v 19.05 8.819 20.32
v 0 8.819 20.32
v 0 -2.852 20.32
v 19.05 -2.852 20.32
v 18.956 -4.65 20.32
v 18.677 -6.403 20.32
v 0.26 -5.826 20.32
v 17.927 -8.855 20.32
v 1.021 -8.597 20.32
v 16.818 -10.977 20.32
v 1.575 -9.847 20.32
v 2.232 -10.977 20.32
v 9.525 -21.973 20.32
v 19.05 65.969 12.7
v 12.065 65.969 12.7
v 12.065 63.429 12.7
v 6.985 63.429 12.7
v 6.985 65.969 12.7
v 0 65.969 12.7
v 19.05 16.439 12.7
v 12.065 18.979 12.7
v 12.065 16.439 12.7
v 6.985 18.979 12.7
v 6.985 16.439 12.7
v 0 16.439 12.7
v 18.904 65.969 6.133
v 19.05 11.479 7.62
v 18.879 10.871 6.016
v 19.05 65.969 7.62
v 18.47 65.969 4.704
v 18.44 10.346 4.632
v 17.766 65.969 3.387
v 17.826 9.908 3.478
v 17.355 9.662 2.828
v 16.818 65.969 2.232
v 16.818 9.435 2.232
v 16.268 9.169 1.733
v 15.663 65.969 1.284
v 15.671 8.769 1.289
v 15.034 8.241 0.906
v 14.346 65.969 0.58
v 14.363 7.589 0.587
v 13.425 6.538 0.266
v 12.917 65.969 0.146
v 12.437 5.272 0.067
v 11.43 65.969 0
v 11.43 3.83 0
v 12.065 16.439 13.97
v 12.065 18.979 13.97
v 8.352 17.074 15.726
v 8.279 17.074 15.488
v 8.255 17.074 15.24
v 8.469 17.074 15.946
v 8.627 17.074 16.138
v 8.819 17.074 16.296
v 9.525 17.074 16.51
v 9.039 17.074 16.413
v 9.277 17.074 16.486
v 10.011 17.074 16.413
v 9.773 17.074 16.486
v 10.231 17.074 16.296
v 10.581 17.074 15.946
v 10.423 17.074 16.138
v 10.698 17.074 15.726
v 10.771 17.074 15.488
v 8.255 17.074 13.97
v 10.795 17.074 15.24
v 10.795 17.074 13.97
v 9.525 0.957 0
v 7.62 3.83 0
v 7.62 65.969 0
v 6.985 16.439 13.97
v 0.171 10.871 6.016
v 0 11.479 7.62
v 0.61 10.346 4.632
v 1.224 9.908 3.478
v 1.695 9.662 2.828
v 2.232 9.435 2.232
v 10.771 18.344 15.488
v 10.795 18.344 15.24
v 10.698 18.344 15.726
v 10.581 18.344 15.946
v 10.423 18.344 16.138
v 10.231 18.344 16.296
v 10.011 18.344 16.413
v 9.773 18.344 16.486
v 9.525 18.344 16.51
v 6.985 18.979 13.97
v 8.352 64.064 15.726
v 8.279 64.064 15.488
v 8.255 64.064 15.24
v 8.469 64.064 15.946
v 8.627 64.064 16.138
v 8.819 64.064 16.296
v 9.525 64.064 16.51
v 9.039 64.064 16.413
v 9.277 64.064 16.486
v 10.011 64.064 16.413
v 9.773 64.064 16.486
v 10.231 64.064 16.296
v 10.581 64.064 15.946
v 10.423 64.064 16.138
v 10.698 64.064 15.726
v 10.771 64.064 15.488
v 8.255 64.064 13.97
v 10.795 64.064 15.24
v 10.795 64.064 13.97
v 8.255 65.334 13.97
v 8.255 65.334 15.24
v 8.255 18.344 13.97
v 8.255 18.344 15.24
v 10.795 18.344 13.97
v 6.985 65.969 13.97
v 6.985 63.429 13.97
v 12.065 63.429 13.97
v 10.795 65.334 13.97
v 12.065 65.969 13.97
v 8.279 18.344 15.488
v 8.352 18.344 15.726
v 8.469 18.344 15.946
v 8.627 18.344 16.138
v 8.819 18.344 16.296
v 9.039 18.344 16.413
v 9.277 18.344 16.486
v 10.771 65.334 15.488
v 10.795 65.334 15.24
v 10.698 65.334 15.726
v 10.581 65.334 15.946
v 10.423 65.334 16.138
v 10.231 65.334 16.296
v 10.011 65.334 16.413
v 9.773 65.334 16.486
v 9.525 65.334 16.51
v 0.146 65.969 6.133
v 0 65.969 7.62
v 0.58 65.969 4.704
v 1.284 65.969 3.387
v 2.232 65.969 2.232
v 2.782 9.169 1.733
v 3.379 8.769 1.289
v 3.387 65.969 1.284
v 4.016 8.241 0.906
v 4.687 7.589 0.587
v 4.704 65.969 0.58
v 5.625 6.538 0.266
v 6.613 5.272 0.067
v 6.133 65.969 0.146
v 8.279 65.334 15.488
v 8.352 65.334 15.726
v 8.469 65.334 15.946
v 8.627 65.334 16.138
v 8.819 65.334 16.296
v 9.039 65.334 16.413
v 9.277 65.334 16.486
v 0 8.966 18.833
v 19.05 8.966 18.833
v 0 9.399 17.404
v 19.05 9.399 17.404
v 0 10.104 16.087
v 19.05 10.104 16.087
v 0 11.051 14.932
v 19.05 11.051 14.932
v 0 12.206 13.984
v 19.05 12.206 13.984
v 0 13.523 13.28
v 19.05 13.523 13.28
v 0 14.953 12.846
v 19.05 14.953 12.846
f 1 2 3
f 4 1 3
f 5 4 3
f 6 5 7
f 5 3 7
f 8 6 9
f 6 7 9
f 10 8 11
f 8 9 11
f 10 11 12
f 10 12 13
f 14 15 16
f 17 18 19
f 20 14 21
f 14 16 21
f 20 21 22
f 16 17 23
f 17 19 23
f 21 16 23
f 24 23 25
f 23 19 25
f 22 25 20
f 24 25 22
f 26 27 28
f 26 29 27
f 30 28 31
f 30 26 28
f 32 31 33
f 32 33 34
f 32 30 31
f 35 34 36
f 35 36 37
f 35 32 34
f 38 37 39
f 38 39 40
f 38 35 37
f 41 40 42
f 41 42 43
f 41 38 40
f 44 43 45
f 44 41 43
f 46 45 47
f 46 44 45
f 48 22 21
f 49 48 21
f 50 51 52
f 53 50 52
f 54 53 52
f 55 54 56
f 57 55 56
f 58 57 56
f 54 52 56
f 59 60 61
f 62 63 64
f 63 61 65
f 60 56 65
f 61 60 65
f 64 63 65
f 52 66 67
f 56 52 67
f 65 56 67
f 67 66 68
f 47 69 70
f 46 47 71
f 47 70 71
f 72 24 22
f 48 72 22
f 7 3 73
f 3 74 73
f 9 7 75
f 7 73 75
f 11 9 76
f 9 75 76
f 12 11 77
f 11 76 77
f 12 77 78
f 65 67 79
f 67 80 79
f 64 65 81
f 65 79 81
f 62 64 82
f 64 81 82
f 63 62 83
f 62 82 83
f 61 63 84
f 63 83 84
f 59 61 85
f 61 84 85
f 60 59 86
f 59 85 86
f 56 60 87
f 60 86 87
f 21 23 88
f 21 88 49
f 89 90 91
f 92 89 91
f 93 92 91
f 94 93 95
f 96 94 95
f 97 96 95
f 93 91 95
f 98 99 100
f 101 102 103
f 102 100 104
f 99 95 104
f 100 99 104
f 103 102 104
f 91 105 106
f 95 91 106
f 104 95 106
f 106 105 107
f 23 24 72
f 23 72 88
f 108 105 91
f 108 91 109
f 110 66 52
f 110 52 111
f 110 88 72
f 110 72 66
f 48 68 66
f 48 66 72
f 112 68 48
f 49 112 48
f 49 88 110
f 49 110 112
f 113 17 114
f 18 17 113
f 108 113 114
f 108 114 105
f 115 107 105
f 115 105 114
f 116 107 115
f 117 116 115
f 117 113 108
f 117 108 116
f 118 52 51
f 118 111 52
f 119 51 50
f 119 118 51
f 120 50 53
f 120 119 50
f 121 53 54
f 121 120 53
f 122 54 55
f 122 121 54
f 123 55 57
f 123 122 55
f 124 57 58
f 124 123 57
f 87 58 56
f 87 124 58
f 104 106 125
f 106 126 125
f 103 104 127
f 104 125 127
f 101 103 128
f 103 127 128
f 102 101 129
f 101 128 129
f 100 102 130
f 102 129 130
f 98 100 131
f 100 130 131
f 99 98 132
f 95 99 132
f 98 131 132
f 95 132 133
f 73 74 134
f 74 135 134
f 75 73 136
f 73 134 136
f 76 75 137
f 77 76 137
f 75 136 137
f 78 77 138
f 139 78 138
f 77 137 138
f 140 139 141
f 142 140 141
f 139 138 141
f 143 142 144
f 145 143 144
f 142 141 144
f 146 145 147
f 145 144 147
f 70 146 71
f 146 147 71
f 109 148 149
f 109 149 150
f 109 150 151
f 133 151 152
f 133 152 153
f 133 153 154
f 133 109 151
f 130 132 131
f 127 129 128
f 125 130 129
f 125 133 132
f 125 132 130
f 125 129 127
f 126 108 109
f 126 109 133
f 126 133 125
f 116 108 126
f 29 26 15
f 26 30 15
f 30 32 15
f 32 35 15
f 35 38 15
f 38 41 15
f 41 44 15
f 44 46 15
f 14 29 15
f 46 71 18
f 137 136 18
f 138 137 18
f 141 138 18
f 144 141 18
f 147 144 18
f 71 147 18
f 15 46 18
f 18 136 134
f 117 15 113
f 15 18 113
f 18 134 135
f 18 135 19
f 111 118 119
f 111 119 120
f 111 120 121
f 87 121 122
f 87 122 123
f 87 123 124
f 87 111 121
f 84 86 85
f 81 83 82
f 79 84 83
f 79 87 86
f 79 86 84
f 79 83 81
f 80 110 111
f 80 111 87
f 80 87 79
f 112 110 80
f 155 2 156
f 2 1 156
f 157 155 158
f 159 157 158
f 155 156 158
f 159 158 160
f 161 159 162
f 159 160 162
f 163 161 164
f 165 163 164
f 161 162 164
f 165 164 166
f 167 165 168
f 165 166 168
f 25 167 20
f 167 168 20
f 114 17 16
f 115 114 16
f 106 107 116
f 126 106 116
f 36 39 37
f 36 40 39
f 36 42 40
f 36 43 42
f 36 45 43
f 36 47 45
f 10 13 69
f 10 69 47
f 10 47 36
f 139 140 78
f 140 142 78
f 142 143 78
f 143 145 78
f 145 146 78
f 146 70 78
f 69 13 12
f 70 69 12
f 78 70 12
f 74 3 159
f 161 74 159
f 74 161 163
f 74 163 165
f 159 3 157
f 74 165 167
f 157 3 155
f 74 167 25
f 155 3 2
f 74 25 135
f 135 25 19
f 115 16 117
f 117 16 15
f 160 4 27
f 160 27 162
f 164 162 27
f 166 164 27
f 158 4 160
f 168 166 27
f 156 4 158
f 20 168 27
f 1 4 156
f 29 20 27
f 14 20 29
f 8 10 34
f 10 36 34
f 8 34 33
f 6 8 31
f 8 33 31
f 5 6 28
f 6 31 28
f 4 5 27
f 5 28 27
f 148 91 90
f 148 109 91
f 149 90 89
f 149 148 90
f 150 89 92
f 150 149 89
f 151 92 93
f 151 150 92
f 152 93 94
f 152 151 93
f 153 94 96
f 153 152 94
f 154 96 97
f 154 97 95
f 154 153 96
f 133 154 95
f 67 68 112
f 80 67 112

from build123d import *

# Parameters (mm, degrees)
F1_DEPTH    = 19.05
F2_T1_DEPTH = 82.895018686
F3_R        = 7.61999
F5_W        = 2.54
F5_H        = 1.27
F6_DEPTH    = 3.81
F4_W        = 5.08
F4_H        = 2.54
F7_DEPTH    = 1.27
F8_R        = 1.26999


# Not quite as in the source:
# - a fillet or chamfer that OpenCascade refuses, or shapes differently, is made with other operations: its cross-section is extruded or revolved along the edge and cut away or added
# - a fillet or chamfer is up to 0.001 mm smaller than in the source, because OpenCascade refuses the exact size


with BuildPart() as f1:
    # F0 (on Right) → F1 (new body)
    with BuildSketch(Plane.YZ):
        Polygon((-22.9305560945, 20.32), (0, 0), (65.9694439055, 0), (65.9694439055, 12.7), (8.8194439055, 12.7), (8.8194439055, 20.32), align=None)
    extrude(amount=F1_DEPTH)

    # F2: chamfer of 10.16 on 2 edges, made by hand

    # F2_s2 → F2_t1 (cut)
    with BuildSketch(Plane(origin=(0, -42.4856252608, 37.6487993462), x_dir=(1, 0, 0), z_dir=(0, 0.7484248802, -0.6632195705))):
        Polygon((8.89, 0), (19.05, -10.16), (19.05, 0), align=None)
        Polygon((10.16, 0), (0, -10.16), (0, 0), align=None)
    extrude(amount=F2_T1_DEPTH, mode=Mode.SUBTRACT)

    # F3 (radius 7.62 in the source; OpenCascade refuses exactly that, so slightly less here)
    f3_edges = [f1.edges().sort_by_distance(p)[0] for p in [
        (0, 3.853932, 10.16),
        (0, 40.644327, 0),
        (19.05, 40.644327, 0),
        (19.05, 3.853932, 10.16),
        (9.525, 8.819444, 12.7),
    ]]
    fillet(f3_edges, radius=F3_R)

    # F5 (on face) → F6 (join)
    with BuildSketch(Plane.XY.offset(12.7)):
        with Locations((9.525, 17.7094439055)):
            Rectangle(F5_W, F5_H)
        with Locations((9.525, 64.6994439055)):
            Rectangle(F5_W, F5_H)
    extrude(amount=F6_DEPTH)

    # F4 (on face) → F7 (join)
    with BuildSketch(Plane.XY.offset(12.7)):
        with Locations((9.525, 17.7094439055)):
            Rectangle(F4_W, F4_H)
        with Locations((9.525, 64.6994439055)):
            Rectangle(F4_W, F4_H)
    extrude(amount=F7_DEPTH)

    # F8 (radius 1.27 in the source; OpenCascade refuses exactly that, so slightly less here)
    f8_edges = [f1.edges().sort_by_distance(p)[0] for p in [
        (10.795, 17.709444, 16.51),
        (8.255, 17.709444, 16.51),
        (8.255, 64.699444, 16.51),
        (10.795, 64.699444, 16.51),
    ]]
    fillet(f8_edges, radius=F8_R)


solid = f1.part
